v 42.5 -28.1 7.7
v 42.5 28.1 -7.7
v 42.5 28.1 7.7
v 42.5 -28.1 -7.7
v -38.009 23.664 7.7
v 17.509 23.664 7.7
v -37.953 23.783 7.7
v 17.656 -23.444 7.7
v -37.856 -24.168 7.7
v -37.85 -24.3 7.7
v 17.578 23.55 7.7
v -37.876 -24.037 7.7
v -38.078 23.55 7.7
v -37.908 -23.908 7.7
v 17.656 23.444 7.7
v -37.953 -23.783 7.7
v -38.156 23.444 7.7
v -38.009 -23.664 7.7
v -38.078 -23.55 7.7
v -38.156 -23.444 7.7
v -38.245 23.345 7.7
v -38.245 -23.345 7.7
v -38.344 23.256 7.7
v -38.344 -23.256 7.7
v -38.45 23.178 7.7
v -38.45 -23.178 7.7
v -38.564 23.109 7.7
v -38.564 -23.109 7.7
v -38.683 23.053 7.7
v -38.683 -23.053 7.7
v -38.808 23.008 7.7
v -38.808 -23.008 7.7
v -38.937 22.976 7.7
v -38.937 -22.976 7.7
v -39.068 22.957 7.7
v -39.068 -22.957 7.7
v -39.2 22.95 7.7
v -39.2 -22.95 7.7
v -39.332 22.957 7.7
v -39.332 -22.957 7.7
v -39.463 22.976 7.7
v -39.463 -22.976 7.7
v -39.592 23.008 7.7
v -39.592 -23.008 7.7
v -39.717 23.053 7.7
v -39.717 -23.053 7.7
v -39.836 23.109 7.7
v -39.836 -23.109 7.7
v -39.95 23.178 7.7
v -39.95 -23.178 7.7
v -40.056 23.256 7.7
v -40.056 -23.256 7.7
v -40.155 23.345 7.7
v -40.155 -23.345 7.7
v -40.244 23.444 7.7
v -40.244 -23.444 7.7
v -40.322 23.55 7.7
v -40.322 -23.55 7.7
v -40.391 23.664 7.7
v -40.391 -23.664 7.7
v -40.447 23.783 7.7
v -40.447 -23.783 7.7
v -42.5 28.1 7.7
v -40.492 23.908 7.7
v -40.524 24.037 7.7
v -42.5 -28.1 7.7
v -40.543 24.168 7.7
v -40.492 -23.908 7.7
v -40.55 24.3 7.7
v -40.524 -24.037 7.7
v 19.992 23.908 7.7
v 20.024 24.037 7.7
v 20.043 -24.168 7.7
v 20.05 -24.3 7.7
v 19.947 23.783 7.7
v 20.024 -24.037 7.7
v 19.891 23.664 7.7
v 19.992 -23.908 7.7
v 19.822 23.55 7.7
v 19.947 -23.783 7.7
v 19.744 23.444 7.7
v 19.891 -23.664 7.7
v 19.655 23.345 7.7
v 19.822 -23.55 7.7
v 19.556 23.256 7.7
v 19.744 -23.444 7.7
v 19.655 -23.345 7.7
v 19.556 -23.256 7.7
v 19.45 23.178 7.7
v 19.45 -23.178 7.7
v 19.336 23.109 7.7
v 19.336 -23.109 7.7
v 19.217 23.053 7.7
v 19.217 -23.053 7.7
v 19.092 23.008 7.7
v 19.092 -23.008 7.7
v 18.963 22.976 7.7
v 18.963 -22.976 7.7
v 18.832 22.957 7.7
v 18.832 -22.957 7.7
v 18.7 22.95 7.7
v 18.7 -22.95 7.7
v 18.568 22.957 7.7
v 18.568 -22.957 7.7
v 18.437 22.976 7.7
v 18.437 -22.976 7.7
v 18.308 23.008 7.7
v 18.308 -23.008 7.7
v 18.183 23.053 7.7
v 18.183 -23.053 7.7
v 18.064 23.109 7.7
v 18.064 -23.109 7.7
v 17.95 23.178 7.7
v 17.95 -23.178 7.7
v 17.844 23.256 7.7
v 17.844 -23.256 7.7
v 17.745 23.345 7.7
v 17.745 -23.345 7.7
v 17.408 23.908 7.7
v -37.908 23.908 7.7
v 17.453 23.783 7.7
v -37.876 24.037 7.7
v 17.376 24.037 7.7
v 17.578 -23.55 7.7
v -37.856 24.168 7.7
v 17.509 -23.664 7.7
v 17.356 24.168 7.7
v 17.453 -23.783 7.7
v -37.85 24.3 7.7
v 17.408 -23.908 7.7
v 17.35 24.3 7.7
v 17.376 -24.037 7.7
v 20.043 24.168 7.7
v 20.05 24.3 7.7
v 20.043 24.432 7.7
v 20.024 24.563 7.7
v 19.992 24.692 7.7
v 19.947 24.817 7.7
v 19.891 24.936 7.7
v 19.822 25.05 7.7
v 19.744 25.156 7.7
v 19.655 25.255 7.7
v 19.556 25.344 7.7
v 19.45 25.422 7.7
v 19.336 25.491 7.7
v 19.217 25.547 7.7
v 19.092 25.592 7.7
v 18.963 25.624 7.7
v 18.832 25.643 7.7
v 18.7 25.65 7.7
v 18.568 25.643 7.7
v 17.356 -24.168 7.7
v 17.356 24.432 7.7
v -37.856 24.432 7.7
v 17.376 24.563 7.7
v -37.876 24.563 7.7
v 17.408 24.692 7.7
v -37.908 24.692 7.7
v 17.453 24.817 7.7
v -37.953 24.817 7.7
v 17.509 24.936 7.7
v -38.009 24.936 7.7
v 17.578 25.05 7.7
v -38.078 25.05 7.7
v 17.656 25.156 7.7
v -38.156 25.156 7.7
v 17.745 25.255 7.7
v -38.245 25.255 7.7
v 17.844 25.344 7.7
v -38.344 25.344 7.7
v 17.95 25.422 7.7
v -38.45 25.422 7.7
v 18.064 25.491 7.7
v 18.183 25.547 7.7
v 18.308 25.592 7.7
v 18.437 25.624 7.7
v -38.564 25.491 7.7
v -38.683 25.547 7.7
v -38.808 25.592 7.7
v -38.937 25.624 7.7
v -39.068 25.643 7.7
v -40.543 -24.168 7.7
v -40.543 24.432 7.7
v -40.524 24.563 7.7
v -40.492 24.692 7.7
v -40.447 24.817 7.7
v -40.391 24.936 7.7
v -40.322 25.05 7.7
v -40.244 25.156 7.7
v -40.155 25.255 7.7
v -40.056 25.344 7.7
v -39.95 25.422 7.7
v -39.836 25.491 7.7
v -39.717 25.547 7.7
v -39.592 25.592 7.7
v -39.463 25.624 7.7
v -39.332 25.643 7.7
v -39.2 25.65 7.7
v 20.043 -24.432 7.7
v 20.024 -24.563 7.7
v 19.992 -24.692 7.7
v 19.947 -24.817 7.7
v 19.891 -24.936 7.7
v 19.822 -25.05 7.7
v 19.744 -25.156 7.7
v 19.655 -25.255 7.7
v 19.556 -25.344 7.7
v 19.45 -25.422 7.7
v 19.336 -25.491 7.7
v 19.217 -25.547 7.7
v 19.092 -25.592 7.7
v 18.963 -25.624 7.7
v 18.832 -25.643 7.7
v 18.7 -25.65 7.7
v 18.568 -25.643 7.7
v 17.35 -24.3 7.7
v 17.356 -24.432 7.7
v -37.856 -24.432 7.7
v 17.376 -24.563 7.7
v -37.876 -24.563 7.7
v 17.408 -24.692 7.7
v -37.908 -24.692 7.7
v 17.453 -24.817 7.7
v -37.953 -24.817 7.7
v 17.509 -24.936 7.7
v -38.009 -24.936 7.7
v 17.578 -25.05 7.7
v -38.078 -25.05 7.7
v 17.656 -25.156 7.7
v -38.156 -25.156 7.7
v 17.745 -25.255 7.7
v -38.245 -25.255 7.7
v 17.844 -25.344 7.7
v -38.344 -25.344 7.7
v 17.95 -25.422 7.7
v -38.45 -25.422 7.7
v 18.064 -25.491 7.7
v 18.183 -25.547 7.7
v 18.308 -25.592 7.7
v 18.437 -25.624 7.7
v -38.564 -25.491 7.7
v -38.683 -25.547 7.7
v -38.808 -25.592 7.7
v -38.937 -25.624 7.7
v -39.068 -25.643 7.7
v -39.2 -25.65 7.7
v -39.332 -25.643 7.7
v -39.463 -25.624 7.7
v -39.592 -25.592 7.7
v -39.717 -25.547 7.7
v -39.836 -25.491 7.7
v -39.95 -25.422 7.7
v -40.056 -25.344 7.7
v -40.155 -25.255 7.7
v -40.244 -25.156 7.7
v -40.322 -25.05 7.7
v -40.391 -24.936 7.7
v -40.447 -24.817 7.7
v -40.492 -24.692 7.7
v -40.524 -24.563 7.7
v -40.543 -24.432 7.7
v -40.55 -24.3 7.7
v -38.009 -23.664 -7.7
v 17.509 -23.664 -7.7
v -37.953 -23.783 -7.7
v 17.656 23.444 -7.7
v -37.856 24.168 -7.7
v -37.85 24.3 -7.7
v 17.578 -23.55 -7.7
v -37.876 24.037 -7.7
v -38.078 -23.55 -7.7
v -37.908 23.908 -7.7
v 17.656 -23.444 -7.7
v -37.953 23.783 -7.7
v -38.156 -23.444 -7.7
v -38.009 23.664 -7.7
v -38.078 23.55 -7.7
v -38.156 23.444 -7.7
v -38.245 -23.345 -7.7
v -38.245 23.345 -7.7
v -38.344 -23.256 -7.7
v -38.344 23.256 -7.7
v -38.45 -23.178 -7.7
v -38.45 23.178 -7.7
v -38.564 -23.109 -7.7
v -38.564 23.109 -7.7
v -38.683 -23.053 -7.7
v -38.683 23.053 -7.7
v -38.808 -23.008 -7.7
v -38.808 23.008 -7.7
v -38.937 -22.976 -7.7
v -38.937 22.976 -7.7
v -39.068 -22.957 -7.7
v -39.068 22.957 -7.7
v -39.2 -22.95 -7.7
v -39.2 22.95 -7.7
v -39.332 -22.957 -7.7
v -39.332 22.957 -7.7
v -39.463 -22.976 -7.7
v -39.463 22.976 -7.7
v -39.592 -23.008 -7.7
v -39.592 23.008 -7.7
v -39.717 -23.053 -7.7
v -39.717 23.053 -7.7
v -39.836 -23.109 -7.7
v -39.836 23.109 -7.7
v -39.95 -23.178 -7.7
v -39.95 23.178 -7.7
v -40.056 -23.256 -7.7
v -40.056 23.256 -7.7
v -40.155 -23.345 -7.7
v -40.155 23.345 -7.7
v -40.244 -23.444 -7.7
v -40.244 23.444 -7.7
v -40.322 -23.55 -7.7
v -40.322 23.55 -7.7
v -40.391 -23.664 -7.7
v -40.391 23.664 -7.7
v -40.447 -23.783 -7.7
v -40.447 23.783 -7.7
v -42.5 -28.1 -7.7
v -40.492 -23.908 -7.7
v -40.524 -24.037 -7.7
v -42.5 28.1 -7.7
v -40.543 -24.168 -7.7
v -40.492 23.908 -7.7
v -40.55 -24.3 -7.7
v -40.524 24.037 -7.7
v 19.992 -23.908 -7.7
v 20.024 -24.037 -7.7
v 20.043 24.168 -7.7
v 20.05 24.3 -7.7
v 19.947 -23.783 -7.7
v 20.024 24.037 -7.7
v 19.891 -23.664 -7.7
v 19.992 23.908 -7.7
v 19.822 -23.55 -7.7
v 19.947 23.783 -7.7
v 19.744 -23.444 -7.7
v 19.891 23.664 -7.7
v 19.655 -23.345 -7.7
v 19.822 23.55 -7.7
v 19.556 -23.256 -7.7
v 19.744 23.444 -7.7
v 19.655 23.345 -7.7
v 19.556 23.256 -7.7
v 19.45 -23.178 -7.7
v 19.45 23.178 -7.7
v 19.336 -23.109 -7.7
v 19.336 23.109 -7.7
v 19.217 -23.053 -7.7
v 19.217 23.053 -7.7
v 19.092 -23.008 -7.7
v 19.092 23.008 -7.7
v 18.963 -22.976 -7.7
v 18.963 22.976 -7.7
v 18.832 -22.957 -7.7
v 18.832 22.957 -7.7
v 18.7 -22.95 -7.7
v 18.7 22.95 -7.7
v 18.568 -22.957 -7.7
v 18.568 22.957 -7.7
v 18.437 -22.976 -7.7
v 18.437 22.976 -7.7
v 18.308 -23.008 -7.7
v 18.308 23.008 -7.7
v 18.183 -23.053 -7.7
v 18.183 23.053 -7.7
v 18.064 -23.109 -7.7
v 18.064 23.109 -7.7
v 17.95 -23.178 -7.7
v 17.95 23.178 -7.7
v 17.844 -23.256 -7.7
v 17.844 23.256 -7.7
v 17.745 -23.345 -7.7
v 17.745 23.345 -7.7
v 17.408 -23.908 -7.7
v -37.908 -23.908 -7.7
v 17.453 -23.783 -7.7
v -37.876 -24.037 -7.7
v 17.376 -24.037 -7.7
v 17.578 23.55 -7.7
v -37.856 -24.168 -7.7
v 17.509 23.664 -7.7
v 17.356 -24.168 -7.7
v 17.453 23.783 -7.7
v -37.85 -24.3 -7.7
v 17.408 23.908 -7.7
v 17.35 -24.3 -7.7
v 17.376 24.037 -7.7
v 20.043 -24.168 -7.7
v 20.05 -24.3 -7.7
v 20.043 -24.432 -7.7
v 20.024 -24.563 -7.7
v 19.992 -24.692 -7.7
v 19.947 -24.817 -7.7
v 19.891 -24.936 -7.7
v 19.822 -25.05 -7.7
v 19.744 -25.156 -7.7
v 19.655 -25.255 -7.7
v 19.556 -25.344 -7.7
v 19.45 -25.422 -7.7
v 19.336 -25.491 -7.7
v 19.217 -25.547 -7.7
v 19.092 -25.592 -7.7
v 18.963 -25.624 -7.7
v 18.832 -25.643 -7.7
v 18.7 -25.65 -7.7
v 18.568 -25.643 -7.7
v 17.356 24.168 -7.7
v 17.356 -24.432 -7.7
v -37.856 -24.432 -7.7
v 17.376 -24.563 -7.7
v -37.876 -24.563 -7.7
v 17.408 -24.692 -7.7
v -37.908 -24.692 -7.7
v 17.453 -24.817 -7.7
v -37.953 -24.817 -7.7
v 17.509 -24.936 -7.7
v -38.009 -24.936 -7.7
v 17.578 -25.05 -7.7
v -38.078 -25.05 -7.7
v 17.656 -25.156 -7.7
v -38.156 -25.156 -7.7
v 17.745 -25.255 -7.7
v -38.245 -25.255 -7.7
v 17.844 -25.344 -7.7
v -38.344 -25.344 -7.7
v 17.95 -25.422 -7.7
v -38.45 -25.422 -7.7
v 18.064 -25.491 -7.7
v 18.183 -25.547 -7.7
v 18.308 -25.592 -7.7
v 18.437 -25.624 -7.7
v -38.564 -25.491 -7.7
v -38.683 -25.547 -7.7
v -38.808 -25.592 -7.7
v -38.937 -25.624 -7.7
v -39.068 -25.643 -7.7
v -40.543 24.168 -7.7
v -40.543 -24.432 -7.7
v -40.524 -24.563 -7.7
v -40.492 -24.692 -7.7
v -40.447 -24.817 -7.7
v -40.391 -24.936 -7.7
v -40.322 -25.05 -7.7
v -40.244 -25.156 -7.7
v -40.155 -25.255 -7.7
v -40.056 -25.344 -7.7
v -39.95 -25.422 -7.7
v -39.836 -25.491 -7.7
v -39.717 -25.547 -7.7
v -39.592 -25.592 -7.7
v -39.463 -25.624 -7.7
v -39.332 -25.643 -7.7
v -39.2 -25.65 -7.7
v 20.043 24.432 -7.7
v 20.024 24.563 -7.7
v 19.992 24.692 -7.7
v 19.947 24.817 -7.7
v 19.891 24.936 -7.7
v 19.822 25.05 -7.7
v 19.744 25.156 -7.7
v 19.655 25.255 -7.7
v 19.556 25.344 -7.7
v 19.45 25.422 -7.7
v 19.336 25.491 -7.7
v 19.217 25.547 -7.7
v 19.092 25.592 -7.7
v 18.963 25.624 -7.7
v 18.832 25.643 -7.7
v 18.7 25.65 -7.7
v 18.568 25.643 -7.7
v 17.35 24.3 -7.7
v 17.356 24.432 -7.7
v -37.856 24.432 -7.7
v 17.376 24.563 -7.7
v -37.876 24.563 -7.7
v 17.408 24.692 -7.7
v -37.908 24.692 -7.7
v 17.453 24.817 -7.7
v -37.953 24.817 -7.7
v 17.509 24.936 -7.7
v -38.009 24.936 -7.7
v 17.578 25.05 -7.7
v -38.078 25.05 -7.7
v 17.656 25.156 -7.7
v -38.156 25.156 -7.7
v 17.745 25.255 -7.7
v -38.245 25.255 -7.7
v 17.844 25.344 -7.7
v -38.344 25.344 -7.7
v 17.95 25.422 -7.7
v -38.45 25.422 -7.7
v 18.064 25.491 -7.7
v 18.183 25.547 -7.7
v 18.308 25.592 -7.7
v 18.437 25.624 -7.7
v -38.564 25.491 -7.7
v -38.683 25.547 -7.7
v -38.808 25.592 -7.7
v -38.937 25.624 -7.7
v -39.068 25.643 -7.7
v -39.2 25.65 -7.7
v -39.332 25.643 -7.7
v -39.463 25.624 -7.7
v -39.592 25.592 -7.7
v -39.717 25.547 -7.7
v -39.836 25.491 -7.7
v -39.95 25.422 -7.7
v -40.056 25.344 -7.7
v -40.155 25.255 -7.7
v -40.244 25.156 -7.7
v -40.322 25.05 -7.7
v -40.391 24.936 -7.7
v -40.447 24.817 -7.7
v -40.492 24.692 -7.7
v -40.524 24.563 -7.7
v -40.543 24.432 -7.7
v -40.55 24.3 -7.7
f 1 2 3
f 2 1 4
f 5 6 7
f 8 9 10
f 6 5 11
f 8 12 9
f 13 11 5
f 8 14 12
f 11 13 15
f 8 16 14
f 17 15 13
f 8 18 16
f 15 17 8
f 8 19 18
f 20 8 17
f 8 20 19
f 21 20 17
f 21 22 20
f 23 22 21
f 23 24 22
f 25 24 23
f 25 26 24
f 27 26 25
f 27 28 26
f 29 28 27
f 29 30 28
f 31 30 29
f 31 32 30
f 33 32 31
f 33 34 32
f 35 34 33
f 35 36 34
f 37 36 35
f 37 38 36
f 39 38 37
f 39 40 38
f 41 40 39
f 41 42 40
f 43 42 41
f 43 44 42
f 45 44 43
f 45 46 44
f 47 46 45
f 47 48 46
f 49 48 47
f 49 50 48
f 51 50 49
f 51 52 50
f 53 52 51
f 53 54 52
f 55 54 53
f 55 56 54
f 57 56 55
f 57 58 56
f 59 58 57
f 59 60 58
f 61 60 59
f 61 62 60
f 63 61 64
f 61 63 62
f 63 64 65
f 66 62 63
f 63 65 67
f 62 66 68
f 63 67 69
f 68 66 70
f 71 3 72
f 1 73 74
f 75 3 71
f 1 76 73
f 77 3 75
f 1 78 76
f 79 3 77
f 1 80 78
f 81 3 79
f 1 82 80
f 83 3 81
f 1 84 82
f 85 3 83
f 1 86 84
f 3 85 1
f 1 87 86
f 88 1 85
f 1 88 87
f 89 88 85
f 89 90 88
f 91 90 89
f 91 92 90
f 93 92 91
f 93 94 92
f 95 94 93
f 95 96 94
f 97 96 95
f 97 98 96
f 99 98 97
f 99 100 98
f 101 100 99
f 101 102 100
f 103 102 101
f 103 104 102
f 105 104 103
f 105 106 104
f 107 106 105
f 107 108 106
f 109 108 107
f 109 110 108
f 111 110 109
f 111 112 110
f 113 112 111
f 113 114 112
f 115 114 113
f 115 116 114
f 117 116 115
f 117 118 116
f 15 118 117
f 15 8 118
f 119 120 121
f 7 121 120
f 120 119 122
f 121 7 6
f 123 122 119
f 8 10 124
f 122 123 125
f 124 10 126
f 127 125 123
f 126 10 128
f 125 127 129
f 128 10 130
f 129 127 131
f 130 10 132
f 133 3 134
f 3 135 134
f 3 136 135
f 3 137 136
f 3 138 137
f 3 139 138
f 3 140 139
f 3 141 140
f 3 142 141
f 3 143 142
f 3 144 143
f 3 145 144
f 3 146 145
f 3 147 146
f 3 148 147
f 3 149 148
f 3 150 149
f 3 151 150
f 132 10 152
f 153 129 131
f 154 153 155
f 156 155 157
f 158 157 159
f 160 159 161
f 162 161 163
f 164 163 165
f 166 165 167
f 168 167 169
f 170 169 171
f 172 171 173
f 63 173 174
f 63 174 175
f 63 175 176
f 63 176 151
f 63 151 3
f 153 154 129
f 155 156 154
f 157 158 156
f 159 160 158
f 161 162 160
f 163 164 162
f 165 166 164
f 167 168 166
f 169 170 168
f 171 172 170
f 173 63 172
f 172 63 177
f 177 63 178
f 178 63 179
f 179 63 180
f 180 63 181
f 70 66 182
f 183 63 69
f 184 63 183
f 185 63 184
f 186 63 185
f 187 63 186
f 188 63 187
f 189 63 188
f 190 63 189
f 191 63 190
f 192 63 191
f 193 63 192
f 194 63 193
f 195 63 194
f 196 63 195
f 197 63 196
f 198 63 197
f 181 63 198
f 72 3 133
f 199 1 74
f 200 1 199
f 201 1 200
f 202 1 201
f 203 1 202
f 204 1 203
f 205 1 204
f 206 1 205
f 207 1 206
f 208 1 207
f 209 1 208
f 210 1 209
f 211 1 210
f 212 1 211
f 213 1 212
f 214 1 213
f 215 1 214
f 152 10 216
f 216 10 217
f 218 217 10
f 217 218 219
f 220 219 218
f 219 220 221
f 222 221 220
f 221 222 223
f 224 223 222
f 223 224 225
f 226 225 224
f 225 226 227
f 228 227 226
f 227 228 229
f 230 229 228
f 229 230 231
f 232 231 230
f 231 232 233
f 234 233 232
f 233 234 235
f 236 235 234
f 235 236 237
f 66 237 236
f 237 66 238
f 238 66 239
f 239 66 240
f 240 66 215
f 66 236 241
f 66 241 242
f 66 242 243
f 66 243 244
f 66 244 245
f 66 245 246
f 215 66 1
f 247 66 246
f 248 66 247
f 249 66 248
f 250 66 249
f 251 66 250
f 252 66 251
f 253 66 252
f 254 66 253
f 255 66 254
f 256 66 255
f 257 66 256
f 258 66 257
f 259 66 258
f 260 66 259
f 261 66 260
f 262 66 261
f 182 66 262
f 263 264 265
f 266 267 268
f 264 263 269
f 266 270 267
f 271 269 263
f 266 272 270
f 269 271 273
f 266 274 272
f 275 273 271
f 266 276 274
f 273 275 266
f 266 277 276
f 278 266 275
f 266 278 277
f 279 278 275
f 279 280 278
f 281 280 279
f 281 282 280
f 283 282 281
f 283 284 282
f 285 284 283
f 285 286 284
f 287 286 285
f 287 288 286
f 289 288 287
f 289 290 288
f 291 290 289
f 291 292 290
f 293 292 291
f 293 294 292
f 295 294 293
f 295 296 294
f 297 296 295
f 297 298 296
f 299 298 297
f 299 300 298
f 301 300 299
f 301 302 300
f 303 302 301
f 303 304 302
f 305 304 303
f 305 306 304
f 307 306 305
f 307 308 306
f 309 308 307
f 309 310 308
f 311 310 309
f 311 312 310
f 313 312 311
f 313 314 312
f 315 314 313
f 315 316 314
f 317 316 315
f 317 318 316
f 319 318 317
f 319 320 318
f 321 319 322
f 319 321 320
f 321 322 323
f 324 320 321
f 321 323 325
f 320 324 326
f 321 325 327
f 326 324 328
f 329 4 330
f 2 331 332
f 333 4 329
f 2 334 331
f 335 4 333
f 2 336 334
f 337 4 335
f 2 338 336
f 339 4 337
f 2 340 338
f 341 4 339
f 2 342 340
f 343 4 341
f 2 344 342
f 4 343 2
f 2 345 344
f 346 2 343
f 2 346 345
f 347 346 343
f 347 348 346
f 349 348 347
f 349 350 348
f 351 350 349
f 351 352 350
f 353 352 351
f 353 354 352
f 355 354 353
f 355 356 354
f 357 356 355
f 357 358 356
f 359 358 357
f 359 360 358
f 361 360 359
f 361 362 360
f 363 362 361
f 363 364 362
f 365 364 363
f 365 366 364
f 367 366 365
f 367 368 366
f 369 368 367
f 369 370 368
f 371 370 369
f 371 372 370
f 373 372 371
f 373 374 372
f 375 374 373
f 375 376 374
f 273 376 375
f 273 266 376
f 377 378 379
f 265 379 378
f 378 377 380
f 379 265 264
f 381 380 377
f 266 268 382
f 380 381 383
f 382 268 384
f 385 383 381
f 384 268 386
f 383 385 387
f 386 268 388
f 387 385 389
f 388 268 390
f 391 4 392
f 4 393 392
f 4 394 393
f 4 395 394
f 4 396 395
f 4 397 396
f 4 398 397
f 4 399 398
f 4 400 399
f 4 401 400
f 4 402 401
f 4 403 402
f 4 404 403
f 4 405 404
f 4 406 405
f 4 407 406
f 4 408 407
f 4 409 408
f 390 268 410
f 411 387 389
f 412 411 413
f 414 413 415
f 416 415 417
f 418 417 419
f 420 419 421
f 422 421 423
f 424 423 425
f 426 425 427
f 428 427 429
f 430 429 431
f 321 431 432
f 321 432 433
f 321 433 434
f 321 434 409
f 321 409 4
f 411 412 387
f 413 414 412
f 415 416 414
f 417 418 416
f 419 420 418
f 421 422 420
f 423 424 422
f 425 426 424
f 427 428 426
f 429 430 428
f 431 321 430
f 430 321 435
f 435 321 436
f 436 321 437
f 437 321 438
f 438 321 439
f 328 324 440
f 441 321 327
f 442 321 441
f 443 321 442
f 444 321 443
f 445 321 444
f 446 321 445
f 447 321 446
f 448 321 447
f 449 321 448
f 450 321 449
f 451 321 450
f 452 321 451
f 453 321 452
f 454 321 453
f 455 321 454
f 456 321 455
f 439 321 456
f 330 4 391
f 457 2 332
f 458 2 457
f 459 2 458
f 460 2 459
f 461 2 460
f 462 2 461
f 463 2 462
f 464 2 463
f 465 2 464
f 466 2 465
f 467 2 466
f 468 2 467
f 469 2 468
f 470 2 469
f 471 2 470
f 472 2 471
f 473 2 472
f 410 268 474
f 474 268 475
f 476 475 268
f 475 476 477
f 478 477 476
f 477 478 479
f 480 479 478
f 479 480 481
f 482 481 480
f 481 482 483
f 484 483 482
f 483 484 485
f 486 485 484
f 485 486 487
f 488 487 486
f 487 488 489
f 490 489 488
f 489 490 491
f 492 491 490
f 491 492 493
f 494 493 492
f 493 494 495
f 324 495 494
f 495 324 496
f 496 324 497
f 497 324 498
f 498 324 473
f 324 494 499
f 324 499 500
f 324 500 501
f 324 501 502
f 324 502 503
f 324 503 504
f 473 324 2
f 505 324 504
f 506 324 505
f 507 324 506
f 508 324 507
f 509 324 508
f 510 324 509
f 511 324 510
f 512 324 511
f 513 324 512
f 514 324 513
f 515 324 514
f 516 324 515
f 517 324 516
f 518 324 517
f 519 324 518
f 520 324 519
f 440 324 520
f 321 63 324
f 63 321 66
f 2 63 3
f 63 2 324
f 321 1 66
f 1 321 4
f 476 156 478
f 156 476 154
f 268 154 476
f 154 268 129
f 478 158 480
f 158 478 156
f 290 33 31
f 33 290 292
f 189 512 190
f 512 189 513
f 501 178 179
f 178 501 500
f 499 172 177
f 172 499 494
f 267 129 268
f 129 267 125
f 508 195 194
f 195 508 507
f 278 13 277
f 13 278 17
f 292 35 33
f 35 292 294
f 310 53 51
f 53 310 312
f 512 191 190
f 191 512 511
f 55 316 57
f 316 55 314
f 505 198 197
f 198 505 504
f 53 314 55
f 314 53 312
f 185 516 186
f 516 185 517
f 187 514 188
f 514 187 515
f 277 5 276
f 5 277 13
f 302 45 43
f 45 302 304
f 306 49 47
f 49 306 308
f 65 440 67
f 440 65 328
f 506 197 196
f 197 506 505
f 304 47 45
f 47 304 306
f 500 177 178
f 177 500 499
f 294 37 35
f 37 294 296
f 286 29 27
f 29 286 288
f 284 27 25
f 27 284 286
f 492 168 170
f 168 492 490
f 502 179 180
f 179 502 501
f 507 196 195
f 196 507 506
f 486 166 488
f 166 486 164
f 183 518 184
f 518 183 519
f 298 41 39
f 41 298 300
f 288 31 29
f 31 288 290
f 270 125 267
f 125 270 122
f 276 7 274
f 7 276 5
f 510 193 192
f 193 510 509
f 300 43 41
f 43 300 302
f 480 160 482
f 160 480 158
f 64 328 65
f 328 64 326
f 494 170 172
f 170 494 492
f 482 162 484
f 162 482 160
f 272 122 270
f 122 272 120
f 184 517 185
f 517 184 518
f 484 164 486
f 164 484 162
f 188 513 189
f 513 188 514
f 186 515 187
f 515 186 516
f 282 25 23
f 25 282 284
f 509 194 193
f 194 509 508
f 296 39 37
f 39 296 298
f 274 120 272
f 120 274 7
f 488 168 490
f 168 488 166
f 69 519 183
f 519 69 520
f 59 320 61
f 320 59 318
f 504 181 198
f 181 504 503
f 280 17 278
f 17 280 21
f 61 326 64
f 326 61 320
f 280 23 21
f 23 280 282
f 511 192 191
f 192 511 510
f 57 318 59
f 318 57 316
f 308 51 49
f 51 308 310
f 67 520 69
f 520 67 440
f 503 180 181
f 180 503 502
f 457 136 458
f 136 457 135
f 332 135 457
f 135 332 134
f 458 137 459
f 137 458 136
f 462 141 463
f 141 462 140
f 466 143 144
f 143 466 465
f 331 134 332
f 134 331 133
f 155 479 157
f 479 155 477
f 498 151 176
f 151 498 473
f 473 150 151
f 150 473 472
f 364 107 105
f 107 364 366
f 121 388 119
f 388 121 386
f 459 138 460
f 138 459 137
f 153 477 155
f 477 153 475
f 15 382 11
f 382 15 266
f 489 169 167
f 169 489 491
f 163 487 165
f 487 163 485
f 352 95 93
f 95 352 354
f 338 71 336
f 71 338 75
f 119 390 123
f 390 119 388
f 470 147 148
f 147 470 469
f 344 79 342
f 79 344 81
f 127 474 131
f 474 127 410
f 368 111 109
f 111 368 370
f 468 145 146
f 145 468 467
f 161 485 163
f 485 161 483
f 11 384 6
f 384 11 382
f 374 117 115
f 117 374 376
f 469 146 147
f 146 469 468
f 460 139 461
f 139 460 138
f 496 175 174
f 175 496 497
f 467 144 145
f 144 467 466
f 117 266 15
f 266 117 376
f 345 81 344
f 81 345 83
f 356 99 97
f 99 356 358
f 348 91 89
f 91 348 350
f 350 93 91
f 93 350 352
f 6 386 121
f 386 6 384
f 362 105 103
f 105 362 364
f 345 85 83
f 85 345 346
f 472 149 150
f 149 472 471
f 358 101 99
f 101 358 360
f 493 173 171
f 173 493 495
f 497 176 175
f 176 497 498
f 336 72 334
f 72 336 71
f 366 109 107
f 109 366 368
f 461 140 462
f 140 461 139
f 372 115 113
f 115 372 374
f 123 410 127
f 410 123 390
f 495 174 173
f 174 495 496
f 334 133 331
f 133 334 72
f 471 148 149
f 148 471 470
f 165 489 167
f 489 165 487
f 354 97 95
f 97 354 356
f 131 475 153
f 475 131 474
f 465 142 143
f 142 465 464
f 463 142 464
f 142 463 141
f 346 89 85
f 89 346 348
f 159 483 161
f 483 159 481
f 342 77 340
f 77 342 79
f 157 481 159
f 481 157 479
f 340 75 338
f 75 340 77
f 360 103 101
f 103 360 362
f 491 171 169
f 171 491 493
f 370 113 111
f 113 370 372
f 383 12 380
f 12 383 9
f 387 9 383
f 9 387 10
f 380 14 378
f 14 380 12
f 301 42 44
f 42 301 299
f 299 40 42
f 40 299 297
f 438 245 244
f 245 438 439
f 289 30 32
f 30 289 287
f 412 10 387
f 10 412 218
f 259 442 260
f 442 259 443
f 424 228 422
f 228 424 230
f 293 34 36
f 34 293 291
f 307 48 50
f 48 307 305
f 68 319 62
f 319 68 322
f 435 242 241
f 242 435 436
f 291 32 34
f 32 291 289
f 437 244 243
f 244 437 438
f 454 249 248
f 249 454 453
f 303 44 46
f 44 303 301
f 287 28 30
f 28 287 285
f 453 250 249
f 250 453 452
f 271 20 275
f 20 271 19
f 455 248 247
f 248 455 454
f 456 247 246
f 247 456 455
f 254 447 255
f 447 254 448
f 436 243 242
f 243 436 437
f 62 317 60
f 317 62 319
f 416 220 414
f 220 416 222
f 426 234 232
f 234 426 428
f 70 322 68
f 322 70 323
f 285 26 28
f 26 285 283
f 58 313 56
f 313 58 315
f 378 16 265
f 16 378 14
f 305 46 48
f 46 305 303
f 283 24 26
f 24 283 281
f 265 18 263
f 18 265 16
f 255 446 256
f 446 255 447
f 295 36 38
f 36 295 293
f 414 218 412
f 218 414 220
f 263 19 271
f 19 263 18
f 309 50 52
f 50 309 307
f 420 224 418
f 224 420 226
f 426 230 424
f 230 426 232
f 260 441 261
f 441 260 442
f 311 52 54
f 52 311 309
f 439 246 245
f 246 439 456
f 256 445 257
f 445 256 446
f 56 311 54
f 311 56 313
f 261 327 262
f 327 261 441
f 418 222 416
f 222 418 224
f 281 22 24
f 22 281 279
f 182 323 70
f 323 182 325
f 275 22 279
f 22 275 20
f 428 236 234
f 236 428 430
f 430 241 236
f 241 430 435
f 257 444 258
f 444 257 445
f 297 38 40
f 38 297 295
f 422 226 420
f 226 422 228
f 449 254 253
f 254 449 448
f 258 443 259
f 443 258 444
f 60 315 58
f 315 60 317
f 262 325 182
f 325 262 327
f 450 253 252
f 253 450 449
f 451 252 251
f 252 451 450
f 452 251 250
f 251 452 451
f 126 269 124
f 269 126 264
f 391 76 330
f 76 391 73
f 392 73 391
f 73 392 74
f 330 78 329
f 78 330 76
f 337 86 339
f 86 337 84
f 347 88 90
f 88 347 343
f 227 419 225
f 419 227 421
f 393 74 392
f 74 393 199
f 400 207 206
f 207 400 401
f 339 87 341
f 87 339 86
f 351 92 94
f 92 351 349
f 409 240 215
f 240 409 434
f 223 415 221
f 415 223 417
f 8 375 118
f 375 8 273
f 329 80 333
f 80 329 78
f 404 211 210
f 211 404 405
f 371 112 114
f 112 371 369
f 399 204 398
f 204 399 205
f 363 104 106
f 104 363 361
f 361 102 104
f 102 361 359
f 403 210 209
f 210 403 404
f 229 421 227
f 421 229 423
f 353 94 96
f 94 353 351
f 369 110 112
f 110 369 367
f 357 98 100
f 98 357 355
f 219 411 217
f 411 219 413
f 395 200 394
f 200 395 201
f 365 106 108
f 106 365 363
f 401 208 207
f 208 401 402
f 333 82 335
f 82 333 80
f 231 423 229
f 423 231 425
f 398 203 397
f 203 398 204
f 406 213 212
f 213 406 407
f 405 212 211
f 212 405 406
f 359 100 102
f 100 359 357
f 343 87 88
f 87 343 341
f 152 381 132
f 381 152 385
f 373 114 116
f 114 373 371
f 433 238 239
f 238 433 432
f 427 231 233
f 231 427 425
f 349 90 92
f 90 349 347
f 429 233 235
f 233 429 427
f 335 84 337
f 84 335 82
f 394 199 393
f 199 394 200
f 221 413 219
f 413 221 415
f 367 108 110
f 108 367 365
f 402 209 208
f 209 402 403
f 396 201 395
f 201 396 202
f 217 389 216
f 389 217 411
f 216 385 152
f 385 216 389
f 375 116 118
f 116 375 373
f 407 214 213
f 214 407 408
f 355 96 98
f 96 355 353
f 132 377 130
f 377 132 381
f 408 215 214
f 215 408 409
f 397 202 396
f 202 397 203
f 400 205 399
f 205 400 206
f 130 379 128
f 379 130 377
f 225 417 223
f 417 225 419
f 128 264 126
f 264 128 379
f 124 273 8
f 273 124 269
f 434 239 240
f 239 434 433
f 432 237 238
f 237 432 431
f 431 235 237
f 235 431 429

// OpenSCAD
$fn = 64;
PI_WIDTH = 85.0;
PI_DEPTH = 56.2;
PI_HEIGHT = 15.4;
PI_HOLE_DIAM = 2.7;
PI_HOLE_X_OFFSET = 3.3;
PI_HOLE_X_DIST = 57.9;
PI_HOLE_Y_DIST = 48.6;
PI_MOUNT_HEIGHT = 4;
PI_SCREW_DIAM = PI_HOLE_DIAM * 0.9;

module pi(){
  difference(){
    /* Body */
    union(){
      cube([PI_WIDTH, PI_DEPTH, PI_HEIGHT], true);
    }
    /* Top left screw hole */
    translate([(-PI_WIDTH / 2) + PI_HOLE_X_OFFSET, PI_HOLE_Y_DIST / 2, 0]){
      cylinder(PI_DEPTH * 2, PI_HOLE_DIAM / 2, PI_HOLE_DIAM / 2, true);
    }
    /* Top right screw hole */
    translate([(-PI_WIDTH / 2) + PI_HOLE_X_OFFSET + PI_HOLE_X_DIST, PI_HOLE_Y_DIST / 2, 0]){
      cylinder(PI_DEPTH * 2, PI_HOLE_DIAM / 2, PI_HOLE_DIAM / 2, true);
    }
    /* Bottom left screw hole */
    translate([(-PI_WIDTH / 2) + PI_HOLE_X_OFFSET, -PI_HOLE_Y_DIST / 2, 0]){
      cylinder(PI_DEPTH * 2, PI_HOLE_DIAM / 2, PI_HOLE_DIAM / 2, true);
    }
    /* Bottom right screw hole */
    translate([(-PI_WIDTH / 2) + PI_HOLE_X_OFFSET + PI_HOLE_X_DIST, -PI_HOLE_Y_DIST / 2, 0]){
      cylinder(PI_DEPTH * 2, PI_HOLE_DIAM / 2, PI_HOLE_DIAM / 2, true);
    }
  }
}

pi();
